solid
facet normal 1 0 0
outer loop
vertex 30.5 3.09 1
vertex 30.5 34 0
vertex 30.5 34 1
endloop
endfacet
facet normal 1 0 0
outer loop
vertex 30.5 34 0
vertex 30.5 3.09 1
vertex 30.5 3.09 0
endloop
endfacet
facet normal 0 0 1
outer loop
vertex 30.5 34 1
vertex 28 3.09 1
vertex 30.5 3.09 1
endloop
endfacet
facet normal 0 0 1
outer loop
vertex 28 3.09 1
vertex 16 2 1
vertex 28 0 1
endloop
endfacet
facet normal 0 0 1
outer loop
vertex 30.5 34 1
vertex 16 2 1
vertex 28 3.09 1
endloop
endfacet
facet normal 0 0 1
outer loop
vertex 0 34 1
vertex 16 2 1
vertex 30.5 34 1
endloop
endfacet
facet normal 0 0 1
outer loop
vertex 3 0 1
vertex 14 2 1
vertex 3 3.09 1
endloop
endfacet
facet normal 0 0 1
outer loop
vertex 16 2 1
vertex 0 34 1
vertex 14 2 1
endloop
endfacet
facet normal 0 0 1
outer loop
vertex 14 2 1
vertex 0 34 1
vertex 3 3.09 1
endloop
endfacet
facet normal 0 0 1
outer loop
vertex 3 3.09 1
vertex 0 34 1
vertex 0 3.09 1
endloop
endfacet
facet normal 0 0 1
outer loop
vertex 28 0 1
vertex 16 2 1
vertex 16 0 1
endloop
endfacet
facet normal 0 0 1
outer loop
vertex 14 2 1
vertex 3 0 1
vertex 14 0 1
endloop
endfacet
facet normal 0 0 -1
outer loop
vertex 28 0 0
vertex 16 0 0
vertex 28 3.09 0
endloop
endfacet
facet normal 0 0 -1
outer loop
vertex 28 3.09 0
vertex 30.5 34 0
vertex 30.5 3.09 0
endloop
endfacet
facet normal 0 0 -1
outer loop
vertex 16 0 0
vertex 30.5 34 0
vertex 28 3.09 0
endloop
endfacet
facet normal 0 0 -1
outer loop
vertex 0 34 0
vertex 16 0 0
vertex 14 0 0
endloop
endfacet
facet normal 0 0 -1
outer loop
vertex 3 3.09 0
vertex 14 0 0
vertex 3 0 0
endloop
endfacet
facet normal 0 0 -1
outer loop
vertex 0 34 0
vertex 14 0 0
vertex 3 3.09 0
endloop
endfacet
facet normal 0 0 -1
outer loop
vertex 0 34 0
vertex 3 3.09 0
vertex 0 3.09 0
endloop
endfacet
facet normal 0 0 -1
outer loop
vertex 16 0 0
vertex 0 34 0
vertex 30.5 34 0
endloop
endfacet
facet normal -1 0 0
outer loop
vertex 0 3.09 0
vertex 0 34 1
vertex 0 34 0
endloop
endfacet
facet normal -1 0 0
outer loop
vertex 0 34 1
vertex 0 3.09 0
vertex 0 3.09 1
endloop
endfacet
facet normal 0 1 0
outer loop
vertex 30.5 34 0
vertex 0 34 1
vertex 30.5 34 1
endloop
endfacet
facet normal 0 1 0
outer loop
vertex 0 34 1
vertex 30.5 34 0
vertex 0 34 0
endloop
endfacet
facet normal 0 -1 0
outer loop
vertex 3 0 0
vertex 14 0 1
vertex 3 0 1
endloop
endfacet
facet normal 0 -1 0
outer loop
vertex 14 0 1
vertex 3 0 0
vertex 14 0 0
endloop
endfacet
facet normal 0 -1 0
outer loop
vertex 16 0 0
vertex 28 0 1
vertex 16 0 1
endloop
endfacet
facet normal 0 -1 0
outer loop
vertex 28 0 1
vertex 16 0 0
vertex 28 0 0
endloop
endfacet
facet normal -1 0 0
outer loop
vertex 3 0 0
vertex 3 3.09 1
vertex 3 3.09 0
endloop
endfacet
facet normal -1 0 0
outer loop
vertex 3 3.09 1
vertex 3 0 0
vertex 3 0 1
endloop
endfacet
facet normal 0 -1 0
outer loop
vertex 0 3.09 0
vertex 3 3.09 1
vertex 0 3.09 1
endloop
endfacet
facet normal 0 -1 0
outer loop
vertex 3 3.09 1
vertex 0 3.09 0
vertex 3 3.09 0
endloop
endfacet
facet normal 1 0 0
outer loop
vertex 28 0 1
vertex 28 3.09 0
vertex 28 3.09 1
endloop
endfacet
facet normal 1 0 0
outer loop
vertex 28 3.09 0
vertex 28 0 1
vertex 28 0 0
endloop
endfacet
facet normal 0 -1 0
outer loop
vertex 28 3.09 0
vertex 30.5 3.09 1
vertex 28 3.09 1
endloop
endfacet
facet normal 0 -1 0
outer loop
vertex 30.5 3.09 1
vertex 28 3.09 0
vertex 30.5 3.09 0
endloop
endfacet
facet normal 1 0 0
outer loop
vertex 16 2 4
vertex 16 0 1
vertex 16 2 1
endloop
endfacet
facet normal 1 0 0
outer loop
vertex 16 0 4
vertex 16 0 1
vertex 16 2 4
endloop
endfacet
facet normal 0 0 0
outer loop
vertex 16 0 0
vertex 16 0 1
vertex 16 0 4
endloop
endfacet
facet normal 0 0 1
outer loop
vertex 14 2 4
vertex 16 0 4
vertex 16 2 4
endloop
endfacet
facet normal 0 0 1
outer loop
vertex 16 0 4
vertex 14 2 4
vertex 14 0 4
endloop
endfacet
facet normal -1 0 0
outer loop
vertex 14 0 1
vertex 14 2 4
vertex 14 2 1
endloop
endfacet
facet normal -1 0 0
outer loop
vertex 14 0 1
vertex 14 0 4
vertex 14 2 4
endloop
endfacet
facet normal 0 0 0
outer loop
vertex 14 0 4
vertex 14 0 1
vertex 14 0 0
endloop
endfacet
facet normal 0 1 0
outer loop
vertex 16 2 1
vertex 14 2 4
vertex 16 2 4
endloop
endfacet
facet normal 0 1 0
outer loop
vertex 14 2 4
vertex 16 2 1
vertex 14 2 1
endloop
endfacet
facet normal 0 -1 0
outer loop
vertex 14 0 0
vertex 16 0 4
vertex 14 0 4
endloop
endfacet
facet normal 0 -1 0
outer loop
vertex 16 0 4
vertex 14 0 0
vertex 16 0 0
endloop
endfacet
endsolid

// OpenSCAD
// file: fb_globals.scad
/// @file fb_globals.scad
///
/// @brief project footbridge globals
///
/// @author © Dave Harris 2022
///
/// Included in all project files.


$fa = 1;   // Fragment angle
$fs = 0.4; // Fragment size resolution

// global constants
//------------------

H_canopy = 47;

H_bridge = 49.5; // platform<>bridge
W_bridge = 36;   // width of bridge
                 // > walkway
W_walk   = 34.5; // width
H_walk   = 36;   // height of walkway


Steps    = 27;   // number of steps
W_stairs = 32;   // width ~ 9'6" @ H0
L_tread  = 3.5;  // tread ~ 12" @ H0
L_stairs = L_tread * (Steps +1);
H_rise   = H_bridge / (Steps +1); 
  // rise is 1.7678, not H0 1.75 (6")

W_lift   = 34;

W_build  = W_stairs +2;
L_build  = L_stairs+W_bridge+W_lift +2;

W_pillar = 4;

L_spacing = L_build /2;

Spans = 6;

L_canopy = ((Spans -1) * L_spacing) + W_pillar;

echo("len",L_canopy);

H_door   = 28;
W_door   = 18;

H_window = 6;
W_window = 16;


W_plat45  = 93.9;
W_track34 = 87.9;
W_plat23  = 93.8;
W_track12 = 87.9;

W_plat23edge =
   ( W_plat23 - W_stairs +2 ) /2 ;
W_plat45edge =
   ( W_plat45 - W_stairs +2 ) /2 ;
   
L_span34 = W_track34 + W_plat45edge + W_plat23edge;

L_span12 = 136.5;

W_grider = 2.2;

W_LEDstrip = 7.5;



// eof
// main file
/// @file buildSpacer.scad
///
/// @brief footbridge span floor
///
/// @author © Dave Harris 2022
///

include<fb_globals.scad>


difference()
{
  translate(
    [ 0, 0.0001, 0 ]  
  ) cube(
      [ 30.5
      , 34
      , 1  ]
    );

  translate(
    [ -0.1, -0.01, -0.1 ]  
  )     cube(
      [ 3.1
      , 3.1
      , 2  ]
    );

  translate(
    [ 28, -0.01, -0.1 ]  
  ) cube(
      [ 3.1
      , 3.1
      , 2  ]
    );
}

  translate(
    [ 14, 0, 0 ]  
  ) cube(
      [ 2
      , 2
      , 4  ]
    );
